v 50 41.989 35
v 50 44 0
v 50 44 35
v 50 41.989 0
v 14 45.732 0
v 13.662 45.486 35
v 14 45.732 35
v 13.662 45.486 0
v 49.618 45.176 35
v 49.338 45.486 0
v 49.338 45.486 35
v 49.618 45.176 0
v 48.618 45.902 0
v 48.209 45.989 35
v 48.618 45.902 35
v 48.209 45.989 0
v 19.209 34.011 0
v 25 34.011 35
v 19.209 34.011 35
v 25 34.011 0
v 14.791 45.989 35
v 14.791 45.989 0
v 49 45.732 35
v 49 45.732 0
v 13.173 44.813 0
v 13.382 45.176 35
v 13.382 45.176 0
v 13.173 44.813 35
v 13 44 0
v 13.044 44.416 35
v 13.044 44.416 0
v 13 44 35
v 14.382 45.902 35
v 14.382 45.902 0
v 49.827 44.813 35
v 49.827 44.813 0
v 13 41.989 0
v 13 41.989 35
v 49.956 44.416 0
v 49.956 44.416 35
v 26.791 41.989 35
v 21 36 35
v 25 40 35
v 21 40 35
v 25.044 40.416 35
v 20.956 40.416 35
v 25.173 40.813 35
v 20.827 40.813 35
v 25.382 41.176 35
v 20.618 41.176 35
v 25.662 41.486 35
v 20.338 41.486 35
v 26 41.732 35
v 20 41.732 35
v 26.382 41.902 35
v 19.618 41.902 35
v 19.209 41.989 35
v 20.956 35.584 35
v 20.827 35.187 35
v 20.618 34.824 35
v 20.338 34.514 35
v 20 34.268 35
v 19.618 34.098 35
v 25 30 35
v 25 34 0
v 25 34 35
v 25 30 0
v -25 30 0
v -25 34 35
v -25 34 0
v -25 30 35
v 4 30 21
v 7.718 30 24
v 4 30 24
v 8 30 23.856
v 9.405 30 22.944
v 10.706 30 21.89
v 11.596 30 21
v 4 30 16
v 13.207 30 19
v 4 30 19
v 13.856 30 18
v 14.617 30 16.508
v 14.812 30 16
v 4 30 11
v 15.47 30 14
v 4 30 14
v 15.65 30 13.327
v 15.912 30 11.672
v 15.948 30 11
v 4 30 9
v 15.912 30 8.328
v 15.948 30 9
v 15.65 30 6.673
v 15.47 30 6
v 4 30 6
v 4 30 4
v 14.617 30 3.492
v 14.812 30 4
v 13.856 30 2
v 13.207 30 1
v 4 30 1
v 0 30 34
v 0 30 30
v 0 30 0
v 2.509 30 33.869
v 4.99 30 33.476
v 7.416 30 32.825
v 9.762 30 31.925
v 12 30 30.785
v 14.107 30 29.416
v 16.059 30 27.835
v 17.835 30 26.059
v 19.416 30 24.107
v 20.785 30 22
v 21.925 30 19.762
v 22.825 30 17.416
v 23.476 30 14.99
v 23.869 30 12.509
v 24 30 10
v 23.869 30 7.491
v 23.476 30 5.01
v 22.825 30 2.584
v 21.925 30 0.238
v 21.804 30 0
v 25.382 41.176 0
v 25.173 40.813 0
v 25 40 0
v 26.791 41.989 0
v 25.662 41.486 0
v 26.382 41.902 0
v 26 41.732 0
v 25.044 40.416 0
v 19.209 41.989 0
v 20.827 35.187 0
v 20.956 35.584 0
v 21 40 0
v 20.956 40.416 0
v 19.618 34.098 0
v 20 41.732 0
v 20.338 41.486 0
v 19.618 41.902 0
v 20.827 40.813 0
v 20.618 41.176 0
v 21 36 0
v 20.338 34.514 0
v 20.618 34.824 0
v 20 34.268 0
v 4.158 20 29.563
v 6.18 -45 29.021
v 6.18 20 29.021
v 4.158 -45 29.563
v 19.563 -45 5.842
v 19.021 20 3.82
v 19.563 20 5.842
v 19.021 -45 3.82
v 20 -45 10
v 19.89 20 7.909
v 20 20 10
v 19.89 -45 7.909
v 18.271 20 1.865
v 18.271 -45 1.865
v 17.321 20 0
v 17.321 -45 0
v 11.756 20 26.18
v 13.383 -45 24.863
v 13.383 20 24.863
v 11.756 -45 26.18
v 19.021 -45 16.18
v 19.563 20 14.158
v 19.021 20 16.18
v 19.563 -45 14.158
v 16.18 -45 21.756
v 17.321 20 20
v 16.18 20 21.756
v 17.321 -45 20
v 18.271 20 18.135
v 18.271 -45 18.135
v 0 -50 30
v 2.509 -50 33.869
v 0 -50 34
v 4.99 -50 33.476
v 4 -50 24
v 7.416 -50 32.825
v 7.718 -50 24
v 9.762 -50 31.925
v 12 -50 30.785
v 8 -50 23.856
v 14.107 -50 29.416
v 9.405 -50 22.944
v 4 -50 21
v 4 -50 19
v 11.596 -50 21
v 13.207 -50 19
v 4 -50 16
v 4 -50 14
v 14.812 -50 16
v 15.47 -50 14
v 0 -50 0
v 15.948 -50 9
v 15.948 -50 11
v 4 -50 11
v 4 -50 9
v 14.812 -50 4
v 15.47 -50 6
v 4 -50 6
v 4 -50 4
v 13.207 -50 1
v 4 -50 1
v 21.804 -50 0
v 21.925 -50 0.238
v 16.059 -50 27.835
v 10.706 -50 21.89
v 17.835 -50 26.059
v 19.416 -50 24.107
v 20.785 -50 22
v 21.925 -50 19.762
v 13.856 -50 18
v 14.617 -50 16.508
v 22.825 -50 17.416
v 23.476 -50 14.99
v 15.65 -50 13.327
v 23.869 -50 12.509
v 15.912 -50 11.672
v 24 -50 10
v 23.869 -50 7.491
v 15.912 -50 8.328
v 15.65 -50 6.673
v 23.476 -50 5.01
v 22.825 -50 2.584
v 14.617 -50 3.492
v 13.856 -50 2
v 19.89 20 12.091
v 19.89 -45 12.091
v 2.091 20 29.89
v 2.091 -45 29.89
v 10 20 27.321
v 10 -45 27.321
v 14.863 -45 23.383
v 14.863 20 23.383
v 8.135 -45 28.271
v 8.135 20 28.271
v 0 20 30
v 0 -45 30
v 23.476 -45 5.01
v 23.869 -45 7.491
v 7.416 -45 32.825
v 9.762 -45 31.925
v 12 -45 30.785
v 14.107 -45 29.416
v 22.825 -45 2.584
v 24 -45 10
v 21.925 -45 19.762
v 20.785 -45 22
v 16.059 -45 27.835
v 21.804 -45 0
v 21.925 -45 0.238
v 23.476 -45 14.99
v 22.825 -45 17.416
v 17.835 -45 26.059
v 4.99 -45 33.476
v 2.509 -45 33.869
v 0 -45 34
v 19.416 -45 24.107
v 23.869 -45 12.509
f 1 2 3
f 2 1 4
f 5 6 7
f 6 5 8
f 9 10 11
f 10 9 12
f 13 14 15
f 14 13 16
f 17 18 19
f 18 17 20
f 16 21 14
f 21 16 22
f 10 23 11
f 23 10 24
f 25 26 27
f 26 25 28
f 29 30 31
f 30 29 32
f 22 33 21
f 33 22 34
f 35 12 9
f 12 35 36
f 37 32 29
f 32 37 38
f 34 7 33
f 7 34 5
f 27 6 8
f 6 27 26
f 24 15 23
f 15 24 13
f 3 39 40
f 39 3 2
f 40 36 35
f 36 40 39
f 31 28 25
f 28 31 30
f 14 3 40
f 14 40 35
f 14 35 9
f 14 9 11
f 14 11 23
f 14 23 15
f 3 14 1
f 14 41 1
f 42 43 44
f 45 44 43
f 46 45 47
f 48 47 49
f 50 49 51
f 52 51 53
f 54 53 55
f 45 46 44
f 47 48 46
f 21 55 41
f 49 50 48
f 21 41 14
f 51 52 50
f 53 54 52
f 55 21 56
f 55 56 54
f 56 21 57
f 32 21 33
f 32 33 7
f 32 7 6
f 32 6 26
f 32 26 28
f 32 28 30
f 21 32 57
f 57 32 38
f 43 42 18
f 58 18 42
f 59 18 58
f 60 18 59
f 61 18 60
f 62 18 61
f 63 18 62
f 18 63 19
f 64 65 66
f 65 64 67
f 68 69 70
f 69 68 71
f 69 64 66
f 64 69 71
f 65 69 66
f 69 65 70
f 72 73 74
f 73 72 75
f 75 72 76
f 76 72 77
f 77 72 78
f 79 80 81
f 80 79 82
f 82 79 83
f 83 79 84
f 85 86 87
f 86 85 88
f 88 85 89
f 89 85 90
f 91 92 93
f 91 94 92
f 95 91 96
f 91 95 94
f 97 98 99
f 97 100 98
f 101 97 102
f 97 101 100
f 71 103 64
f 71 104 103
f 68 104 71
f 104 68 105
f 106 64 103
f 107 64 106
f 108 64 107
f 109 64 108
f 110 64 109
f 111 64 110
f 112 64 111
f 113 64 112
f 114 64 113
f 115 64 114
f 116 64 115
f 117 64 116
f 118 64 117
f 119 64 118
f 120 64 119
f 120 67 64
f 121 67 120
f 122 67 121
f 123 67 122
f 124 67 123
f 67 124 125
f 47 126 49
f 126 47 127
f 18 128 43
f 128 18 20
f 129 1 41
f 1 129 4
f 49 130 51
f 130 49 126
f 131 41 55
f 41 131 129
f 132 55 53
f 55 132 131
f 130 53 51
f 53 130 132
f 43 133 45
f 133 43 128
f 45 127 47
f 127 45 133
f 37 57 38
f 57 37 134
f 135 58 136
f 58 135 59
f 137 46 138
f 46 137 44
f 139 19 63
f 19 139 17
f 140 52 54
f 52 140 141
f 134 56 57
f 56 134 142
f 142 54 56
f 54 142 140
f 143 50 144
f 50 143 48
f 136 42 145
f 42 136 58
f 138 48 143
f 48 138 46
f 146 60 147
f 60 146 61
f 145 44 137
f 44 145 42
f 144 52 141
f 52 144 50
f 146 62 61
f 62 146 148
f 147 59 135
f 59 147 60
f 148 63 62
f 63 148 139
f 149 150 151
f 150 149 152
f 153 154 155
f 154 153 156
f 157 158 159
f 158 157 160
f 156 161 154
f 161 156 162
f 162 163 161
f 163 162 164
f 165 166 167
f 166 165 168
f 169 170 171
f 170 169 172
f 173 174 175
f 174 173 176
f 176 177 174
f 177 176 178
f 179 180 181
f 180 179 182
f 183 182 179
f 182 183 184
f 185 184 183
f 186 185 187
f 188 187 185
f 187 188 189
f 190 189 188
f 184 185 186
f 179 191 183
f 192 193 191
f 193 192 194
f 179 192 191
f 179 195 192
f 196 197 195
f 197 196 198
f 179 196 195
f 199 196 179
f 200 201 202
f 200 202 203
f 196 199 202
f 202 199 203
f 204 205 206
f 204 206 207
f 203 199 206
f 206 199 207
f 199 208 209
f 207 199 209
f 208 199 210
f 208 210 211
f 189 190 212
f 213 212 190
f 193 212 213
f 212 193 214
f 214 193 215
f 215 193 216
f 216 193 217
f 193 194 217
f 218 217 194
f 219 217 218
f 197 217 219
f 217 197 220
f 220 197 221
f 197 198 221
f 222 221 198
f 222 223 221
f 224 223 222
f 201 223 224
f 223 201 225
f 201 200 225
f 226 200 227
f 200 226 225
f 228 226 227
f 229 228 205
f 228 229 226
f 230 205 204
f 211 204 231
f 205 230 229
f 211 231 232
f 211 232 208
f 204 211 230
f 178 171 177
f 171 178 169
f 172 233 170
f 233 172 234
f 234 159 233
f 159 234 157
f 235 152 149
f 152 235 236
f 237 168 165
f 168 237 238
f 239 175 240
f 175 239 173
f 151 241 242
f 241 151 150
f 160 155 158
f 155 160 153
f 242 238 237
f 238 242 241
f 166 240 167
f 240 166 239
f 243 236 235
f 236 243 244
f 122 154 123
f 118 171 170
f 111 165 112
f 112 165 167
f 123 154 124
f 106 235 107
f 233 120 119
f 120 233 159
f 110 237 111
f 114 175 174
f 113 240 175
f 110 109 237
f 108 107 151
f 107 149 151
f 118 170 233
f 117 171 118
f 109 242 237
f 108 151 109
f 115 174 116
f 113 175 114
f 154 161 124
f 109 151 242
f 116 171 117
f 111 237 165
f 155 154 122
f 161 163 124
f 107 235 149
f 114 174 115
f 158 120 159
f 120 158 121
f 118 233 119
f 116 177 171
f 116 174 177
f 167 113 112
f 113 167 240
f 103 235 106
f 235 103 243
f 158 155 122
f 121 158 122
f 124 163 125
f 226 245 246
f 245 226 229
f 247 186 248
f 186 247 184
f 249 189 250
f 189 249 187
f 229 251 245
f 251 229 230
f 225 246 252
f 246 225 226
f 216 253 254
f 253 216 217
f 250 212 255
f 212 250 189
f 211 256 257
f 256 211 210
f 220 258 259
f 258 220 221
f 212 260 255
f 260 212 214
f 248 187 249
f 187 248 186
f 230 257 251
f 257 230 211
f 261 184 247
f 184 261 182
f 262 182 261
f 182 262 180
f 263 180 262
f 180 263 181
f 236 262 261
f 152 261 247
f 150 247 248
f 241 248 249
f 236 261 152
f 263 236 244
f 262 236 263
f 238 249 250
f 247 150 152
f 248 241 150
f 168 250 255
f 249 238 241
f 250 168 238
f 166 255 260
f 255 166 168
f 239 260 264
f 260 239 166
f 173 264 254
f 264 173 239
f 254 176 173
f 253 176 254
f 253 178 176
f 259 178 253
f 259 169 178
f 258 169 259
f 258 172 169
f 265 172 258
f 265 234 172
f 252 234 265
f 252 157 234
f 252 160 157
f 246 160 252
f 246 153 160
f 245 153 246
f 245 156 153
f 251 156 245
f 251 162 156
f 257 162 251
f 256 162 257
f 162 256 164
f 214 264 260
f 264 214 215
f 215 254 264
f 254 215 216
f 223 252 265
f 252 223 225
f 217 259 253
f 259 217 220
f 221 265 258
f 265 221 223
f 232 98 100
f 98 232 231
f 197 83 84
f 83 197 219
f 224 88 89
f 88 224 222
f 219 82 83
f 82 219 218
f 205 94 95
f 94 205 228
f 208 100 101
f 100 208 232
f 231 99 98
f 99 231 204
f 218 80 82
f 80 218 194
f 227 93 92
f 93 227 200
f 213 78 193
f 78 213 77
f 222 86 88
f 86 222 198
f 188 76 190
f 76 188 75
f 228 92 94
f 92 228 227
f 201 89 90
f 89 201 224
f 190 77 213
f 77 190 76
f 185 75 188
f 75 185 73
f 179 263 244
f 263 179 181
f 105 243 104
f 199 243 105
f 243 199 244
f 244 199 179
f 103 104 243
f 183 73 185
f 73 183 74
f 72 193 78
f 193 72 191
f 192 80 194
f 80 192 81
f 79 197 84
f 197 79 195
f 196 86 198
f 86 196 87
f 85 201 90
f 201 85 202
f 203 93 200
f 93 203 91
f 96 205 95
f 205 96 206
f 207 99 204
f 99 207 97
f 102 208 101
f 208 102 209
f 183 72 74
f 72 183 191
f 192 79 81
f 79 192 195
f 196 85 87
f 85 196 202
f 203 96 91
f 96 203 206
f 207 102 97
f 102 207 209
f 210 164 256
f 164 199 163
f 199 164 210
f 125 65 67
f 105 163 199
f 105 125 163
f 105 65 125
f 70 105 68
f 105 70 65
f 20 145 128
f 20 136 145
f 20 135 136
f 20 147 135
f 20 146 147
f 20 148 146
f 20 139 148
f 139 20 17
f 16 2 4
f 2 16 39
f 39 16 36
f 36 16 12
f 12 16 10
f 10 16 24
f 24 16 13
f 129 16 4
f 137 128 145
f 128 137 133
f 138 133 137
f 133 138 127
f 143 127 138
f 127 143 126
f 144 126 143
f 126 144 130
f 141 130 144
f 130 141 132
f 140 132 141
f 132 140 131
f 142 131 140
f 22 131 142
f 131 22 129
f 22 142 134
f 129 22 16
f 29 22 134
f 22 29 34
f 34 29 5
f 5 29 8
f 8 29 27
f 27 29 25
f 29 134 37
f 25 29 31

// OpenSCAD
//Length of hook to hang spool on.
tube_length = 80;
//Diameter of spool holder
tube_diameter = 40;
//Size of spool retaining lip. Don't go too big or your spool won't fit over it.
lip_size = 4;
//Cut short some for easy printing with no support
cut_support = 15; 
//Thickness of the wall in the back of your printer.  Use 8 for flashforge.
hanger_gap = 8;  
//Thickness of hanger structure.  
structure_thickness = 4;
//Overall width of hanger
hanger_width = 50;  
/* [Hidden] */
hanger_gap_height = 15;
fillet_radius = 2;
tube_radius = tube_diameter/2;

difference() {
//transform for printing bed
translate([0, 30,hanger_width/2 - cut_support ])
rotate([0,90,0])
union() {
	$fn=60;
	translate([-hanger_width/2,structure_thickness+hanger_gap,50/2-hanger_gap_height])
	difference() {
		union() {
			translate([0,-hanger_gap,3]) //cube([50,structure_thickness+hanger_gap,40-3]);
			h_rounded_cube([50,structure_thickness+hanger_gap,40-3],2);
			translate([0,-hanger_gap,-50+hanger_gap_height]) mirror([0,1,0])
				cube([50,structure_thickness,50]);
		}
		mirror([0,1,0]) translate([-1,0,15]) 
			h_rounded_cube([hanger_width+2,10,30],fillet_radius);
		mirror([0,1,0]) translate([-1,0,-10]) 
			h_rounded_cube([hanger_width+2,hanger_gap,15-structure_thickness+10],fillet_radius);
	}
	//tube
	difference() {
		union() {
			rotate([90,0,0]) cylinder(h=tube_length, r=tube_radius);
			rotate([90,0,0]) cylinder(h=10, r1=tube_radius+lip_size, r2=tube_radius);
			translate([0,-tube_length,0]) rotate([-90,0,0]) 
				cylinder(h=5, r=tube_radius+lip_size);
		}
		rotate([90,0,0]) cylinder(h=tube_length+1, r=tube_radius-structure_thickness);
		translate([-500,-500])mirror([0,0,1])cube([1000,1000,1000]);
	}
	//make ribs on the center for support in the direction of gravity.
	intersection() {
		rotate([90,0,0]) cylinder(h=tube_length, r=tube_radius);
		union() {
			for(i = [-40:5:40]) {
				rotate([90,0,0]) translate([-1+i,0,0]) cube([2,100,100]);
			} 
			translate([-hanger_width/2,-tube_length,0])
				cube([hanger_width,tube_length,structure_thickness]);
		}
	}
}
translate([-500,-500,-1000])
cube([1000, 1000, 1000]);
}


module h_rounded_cube(xyz,r,$fn=30) {
	x = xyz[2];
	y = xyz[1];
	z = xyz[0];
	translate([z,0])
	rotate([0,-90,0])
	translate([r,r])
	hull() {
		cylinder(h=z,r=r);
		translate([0,y-2*r])
		cylinder(h=z,r=r);
		translate([x-2*r,0])
		cylinder(h=z,r=r);
		translate([x-2*r,y-2*r])
		cylinder(h=z,r=r);
	}
}
